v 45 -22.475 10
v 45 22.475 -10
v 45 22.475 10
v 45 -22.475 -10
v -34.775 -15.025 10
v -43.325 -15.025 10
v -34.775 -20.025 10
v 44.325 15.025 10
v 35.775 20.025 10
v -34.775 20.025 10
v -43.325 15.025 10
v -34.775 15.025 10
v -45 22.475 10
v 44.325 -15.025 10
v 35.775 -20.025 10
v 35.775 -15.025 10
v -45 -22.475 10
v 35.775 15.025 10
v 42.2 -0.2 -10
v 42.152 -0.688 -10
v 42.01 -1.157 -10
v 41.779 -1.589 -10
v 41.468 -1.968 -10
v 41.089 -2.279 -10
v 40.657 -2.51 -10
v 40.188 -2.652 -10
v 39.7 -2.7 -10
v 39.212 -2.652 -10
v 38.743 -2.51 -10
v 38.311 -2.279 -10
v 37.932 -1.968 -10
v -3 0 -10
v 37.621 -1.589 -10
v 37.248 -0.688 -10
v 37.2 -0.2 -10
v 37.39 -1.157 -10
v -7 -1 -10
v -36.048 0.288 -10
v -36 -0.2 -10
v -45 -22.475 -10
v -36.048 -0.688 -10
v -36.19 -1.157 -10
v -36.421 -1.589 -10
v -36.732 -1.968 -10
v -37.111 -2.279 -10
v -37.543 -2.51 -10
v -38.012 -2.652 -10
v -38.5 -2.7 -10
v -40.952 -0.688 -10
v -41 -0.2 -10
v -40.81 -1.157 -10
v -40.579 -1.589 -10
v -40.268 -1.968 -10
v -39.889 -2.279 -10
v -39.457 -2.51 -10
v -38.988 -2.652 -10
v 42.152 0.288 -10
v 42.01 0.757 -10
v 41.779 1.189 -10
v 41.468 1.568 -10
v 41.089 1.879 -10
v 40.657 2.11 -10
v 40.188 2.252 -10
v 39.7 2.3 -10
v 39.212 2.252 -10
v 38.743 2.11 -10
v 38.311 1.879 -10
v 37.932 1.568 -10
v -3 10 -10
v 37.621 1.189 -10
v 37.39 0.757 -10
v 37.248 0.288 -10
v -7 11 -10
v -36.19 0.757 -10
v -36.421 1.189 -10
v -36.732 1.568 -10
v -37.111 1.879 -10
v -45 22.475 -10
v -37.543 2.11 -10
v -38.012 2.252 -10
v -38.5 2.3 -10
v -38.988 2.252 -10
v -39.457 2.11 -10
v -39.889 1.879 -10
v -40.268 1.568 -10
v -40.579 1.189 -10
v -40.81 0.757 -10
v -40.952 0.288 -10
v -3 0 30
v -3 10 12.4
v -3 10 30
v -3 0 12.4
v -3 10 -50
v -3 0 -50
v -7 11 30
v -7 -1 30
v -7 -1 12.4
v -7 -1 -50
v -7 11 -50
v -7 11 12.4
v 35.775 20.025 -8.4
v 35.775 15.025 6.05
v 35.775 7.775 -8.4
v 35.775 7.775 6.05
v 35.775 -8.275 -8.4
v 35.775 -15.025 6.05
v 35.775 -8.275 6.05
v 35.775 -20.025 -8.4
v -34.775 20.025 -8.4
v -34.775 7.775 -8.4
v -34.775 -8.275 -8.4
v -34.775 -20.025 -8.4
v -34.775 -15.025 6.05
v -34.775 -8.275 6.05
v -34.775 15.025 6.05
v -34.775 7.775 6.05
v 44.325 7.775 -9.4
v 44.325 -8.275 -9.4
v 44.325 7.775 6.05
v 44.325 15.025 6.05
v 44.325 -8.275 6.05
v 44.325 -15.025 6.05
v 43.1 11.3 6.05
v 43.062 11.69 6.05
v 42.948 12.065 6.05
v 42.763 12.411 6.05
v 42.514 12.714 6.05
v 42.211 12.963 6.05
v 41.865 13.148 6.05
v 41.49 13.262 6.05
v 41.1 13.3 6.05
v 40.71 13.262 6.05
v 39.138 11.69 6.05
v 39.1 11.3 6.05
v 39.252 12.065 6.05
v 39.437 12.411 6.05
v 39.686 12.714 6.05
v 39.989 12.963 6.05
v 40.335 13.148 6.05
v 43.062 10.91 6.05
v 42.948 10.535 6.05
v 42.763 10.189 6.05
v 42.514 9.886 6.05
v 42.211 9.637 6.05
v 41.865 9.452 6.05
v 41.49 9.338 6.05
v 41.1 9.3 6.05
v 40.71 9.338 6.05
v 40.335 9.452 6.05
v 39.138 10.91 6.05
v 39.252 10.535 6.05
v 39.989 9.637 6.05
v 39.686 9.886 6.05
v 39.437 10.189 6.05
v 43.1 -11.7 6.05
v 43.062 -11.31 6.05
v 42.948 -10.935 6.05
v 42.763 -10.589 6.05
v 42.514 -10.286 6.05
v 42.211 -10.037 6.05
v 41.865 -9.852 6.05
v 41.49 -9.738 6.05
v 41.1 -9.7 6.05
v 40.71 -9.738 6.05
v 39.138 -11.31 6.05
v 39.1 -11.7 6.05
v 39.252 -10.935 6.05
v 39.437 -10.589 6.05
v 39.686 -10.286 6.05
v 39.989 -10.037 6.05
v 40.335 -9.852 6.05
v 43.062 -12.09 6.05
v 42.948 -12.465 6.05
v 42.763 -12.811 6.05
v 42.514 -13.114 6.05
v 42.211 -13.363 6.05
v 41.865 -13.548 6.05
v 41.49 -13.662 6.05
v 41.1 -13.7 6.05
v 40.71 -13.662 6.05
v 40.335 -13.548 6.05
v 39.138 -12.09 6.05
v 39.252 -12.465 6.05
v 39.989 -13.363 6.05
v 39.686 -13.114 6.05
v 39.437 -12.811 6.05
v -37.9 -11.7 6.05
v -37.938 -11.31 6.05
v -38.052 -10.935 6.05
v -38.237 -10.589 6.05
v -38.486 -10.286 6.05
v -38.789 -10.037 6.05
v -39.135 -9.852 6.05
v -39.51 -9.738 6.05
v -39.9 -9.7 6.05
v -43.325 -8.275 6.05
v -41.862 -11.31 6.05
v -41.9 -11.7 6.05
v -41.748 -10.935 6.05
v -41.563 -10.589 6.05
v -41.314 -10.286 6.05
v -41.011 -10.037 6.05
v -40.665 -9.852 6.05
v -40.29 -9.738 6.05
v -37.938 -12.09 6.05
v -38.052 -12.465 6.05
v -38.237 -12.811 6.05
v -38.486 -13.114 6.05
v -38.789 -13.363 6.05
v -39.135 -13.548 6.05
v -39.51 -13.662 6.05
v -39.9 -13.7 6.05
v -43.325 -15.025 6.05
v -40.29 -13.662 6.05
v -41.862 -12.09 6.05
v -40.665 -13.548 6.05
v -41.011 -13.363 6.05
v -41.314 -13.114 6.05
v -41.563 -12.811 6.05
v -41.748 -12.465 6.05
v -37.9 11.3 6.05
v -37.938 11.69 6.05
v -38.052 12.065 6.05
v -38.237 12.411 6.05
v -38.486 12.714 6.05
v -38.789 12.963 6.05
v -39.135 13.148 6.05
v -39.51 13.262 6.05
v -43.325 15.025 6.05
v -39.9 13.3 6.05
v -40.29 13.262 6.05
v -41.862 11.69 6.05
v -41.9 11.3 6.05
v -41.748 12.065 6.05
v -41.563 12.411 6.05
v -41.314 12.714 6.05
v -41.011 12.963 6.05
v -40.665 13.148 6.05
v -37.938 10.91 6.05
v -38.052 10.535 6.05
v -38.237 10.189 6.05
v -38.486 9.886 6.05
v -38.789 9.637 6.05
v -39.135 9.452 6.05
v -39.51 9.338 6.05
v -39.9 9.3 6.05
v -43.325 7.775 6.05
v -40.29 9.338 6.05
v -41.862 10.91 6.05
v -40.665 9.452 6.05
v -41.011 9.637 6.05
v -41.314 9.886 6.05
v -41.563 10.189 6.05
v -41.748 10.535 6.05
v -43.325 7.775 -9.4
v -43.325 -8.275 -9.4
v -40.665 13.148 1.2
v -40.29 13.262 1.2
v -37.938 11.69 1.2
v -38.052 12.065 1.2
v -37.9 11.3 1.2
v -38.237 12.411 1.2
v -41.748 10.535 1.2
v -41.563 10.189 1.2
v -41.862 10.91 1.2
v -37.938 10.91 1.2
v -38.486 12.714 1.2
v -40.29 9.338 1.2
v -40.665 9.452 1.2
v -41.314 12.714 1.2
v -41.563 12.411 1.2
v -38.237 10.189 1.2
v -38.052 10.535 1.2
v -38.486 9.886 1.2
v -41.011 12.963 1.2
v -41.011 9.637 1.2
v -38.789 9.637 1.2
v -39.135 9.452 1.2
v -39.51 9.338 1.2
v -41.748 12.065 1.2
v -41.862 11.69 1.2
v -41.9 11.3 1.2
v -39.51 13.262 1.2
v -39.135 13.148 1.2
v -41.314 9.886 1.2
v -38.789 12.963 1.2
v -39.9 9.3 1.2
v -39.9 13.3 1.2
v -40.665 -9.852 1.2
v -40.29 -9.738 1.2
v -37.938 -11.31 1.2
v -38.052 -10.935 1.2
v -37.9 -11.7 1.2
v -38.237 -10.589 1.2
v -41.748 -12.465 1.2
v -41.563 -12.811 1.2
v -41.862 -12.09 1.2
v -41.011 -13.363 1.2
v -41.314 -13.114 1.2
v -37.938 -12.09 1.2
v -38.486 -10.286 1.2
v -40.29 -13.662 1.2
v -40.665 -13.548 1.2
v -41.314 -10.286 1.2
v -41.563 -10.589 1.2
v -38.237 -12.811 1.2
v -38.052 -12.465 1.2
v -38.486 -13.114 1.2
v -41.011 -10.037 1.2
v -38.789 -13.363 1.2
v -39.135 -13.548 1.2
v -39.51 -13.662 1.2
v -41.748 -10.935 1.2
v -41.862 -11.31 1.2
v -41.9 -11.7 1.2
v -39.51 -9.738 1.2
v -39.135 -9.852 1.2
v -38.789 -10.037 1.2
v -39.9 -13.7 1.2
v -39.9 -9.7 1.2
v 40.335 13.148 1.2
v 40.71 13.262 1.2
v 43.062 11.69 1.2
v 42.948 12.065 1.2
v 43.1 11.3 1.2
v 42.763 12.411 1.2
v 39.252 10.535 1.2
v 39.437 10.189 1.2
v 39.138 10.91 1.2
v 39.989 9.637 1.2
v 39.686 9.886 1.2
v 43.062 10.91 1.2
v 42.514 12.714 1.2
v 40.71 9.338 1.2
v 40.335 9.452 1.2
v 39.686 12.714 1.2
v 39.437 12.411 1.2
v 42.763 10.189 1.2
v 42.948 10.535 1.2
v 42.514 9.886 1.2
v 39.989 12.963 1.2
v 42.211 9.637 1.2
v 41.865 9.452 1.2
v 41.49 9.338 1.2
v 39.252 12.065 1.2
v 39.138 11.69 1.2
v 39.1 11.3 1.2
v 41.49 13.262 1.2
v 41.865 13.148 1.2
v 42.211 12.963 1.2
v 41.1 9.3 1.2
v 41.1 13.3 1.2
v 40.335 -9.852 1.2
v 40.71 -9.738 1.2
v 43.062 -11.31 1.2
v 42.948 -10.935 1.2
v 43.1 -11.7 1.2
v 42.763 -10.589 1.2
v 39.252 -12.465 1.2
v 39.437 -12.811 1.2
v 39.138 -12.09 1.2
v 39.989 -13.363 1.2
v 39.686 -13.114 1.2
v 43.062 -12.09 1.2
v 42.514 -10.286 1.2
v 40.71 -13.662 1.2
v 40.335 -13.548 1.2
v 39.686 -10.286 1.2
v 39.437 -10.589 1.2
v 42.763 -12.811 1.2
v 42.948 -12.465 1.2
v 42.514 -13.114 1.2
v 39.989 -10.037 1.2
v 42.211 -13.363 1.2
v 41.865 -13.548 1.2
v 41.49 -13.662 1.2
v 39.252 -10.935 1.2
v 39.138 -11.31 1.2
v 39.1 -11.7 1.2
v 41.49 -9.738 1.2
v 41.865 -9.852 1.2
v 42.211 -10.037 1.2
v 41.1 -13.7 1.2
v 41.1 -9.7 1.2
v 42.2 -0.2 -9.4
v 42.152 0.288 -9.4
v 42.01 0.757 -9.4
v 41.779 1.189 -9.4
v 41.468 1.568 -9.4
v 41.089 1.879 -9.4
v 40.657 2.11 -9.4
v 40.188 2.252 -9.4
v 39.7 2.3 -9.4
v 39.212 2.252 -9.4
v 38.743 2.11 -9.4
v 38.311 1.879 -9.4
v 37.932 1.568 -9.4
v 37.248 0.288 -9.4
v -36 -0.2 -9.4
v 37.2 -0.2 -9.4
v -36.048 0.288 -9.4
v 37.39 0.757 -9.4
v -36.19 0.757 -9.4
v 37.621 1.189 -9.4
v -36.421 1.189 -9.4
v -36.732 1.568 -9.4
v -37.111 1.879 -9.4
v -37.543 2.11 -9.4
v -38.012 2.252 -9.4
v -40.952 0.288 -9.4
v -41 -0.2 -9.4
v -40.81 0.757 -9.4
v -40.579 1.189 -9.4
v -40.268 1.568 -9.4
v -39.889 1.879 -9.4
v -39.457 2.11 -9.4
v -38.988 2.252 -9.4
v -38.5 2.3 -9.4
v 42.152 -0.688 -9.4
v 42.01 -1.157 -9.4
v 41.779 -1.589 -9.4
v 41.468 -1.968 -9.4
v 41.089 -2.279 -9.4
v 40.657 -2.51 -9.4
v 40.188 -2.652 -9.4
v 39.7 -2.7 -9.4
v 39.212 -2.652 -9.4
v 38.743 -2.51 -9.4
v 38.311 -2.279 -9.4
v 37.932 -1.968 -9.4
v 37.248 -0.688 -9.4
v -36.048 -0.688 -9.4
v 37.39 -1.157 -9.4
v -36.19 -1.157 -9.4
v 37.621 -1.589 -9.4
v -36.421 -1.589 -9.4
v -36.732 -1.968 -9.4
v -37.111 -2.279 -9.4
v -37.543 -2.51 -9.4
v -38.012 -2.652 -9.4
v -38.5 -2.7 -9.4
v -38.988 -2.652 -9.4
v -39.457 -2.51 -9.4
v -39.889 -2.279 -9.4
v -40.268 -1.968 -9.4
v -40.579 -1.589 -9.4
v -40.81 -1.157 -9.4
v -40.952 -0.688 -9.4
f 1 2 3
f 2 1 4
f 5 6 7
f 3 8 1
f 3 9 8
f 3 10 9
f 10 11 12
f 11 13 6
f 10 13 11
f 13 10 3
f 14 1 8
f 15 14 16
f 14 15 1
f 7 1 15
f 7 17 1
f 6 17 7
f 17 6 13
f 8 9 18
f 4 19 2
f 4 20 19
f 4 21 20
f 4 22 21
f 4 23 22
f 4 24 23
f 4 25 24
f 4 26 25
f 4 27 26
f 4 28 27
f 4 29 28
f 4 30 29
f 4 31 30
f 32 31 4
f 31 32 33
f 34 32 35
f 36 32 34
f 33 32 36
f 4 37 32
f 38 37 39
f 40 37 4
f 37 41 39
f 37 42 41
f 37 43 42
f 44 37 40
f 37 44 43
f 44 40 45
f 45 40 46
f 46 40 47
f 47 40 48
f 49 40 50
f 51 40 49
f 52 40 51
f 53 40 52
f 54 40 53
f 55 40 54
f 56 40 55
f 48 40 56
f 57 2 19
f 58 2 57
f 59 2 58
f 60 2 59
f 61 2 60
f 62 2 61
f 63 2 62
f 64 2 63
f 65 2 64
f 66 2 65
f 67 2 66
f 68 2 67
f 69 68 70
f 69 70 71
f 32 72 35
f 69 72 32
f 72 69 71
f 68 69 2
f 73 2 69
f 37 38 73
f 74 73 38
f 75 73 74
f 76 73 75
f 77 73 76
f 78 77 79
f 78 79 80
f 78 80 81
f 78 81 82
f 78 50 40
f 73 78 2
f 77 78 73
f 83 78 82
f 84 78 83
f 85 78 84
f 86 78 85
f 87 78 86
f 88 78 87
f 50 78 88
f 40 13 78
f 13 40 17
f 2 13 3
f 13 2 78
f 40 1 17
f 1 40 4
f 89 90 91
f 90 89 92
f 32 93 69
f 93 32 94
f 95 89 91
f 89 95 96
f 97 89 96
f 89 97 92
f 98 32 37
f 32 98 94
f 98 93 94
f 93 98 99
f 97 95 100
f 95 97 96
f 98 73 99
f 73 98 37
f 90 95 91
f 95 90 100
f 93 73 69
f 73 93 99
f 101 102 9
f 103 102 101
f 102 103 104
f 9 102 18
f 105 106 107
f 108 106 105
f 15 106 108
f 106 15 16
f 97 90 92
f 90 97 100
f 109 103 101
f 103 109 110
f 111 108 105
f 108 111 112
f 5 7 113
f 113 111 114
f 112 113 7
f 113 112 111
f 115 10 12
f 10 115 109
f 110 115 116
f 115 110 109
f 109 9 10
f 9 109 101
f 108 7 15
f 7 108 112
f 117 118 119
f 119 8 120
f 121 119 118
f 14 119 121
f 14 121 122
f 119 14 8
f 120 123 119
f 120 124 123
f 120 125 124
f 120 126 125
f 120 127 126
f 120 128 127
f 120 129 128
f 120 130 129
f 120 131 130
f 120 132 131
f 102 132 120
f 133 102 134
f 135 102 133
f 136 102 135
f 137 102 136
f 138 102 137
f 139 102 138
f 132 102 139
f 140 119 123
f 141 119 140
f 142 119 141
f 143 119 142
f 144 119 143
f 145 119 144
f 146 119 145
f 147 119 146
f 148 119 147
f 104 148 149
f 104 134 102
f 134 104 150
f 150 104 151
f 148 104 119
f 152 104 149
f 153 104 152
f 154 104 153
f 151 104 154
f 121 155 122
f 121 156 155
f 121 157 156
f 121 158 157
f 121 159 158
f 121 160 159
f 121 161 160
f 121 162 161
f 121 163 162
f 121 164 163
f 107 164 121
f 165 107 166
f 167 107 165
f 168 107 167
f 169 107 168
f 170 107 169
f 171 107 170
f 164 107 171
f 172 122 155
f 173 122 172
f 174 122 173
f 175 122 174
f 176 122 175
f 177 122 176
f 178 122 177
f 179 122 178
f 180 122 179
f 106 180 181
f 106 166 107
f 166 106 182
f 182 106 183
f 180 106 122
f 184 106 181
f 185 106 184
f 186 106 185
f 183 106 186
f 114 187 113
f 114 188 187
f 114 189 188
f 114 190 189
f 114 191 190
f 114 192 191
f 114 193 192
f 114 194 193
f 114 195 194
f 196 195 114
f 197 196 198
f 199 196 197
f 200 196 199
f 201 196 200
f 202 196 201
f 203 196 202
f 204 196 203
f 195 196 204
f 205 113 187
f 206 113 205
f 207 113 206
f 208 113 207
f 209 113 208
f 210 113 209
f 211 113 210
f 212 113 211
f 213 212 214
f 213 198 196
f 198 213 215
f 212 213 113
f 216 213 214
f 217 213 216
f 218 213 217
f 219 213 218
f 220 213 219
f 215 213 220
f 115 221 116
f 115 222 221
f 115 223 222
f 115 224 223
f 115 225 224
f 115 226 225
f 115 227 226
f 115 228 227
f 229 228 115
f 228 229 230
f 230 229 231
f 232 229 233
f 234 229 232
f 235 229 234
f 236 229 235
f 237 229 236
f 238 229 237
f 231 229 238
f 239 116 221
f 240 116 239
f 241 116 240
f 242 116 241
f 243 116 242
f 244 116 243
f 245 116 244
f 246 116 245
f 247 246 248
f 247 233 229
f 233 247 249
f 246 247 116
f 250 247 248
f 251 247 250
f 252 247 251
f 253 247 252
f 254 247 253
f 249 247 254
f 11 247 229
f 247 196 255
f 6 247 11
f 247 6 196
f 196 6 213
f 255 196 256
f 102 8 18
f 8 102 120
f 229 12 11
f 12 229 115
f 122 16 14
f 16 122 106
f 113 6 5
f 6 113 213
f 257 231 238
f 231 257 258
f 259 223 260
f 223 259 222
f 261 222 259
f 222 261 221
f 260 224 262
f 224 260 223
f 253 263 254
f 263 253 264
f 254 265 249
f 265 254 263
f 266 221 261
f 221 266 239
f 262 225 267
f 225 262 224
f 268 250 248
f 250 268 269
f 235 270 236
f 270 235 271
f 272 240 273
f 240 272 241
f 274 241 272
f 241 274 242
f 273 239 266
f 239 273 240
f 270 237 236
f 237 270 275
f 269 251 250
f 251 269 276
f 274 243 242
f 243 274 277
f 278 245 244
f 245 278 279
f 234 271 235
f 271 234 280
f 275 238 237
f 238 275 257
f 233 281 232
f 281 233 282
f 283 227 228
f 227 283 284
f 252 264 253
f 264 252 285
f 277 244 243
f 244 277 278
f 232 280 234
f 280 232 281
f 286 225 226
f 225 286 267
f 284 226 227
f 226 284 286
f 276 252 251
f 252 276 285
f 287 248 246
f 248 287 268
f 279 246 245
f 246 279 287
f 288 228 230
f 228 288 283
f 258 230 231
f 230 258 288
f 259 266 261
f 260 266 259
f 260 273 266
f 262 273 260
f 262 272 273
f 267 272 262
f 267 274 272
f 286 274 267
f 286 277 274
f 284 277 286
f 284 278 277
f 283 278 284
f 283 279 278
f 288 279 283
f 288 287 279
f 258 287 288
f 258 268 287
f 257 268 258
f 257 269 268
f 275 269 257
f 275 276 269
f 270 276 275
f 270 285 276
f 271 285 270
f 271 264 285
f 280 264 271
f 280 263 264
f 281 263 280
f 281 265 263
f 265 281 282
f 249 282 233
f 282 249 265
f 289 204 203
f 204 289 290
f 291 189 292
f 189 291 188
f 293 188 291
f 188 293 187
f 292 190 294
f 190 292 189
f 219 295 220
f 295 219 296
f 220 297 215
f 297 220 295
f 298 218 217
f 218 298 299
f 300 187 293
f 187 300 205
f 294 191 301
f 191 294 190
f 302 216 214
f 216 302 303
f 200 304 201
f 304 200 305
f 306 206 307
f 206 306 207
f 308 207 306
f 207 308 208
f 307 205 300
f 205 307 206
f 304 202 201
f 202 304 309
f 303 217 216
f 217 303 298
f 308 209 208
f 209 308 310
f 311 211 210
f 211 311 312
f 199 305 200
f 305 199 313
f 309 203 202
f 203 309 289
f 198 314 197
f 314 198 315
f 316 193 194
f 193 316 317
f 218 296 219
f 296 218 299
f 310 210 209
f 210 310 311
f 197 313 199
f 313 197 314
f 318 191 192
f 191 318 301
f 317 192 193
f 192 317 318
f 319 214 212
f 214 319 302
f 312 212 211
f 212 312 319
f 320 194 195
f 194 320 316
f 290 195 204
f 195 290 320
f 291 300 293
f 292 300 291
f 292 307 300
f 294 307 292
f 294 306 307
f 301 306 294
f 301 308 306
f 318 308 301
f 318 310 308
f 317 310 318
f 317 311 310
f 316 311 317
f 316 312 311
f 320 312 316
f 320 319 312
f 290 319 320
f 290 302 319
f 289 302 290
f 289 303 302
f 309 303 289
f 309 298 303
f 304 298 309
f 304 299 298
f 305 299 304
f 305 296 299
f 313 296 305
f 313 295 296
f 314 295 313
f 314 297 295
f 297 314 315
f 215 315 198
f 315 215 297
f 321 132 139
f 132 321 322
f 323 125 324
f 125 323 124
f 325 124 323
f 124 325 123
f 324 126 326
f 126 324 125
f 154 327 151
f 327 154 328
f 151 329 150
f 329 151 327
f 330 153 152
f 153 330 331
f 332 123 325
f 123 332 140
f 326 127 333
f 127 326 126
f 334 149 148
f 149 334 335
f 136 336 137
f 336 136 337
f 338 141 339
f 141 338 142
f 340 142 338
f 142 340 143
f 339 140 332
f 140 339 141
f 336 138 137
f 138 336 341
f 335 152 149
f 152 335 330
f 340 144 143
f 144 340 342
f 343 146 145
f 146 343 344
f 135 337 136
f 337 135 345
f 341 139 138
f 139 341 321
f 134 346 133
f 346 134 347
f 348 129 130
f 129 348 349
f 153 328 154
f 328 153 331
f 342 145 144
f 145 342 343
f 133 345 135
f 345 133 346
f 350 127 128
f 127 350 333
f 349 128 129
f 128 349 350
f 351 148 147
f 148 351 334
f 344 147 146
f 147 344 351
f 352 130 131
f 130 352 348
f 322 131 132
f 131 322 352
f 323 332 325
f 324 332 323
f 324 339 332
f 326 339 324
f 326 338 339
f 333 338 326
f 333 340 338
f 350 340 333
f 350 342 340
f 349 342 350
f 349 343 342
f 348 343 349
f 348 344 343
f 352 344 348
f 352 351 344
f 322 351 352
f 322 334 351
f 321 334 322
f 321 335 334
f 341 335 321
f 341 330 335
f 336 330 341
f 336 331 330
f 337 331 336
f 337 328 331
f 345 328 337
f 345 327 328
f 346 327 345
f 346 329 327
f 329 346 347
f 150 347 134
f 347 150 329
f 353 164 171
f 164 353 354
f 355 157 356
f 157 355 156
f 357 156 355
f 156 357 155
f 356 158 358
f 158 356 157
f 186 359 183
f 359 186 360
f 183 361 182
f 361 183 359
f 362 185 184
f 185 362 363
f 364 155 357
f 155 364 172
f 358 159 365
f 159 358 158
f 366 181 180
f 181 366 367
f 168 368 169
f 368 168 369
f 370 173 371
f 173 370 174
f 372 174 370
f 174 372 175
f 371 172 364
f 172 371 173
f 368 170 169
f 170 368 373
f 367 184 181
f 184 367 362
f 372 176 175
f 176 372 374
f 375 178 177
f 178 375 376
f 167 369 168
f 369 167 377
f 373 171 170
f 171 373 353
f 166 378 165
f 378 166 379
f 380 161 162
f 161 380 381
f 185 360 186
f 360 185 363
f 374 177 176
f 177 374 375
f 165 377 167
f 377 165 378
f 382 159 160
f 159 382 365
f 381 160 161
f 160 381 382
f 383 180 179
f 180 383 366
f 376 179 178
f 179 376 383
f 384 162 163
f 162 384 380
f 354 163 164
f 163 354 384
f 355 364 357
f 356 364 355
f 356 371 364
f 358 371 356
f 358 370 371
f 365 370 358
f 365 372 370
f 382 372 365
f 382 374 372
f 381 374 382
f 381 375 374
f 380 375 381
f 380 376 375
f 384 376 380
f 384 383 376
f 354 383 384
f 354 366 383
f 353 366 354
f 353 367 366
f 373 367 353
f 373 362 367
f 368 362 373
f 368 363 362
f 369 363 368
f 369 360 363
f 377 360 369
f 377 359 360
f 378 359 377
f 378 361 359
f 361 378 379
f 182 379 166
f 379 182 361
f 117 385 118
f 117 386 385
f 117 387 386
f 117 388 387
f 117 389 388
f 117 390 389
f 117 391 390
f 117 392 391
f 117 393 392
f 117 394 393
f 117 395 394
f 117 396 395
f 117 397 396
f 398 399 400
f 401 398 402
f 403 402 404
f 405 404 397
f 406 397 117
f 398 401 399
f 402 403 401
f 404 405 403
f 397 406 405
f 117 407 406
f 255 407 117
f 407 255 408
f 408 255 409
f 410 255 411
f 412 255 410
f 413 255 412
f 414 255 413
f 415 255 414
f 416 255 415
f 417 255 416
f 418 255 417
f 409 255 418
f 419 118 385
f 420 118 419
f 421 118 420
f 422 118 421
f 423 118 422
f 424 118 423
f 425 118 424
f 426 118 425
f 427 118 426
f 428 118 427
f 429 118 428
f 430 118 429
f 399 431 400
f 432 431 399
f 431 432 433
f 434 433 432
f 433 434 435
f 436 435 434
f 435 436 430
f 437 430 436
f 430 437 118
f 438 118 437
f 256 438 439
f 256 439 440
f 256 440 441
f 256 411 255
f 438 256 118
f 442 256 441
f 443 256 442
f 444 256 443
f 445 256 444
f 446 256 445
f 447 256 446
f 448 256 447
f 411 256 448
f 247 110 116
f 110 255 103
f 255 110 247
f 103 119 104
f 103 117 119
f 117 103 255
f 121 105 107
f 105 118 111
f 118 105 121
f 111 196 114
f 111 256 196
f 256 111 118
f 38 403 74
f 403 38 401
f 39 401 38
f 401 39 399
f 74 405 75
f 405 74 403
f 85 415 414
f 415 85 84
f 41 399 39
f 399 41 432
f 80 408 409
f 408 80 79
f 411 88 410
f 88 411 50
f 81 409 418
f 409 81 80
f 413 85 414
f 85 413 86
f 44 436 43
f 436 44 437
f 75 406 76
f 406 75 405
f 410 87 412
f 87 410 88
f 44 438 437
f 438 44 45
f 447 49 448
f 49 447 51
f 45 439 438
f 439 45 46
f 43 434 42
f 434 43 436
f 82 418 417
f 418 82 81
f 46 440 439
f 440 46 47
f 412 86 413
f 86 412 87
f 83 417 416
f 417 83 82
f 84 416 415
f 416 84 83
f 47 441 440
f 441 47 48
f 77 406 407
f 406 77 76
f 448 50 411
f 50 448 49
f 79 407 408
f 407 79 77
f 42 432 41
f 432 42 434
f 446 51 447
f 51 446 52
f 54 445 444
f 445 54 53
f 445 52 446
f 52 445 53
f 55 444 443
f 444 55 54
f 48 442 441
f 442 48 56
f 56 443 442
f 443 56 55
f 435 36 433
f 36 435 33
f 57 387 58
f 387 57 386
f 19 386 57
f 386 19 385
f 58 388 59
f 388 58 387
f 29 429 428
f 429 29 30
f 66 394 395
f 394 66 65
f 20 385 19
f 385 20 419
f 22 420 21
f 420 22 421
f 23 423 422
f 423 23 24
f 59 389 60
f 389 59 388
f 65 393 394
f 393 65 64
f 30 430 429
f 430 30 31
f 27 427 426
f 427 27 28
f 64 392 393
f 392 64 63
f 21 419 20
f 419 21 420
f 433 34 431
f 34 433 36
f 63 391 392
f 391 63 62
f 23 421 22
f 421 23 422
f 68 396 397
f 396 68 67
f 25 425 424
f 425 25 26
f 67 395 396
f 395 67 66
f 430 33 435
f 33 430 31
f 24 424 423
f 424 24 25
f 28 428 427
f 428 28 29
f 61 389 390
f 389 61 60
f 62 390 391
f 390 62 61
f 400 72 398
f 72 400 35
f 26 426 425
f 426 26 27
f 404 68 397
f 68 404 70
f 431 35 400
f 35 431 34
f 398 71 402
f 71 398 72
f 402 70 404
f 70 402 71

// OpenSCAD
// file: BOSL2/std.scad
// Minimal BOSL2 compatibility shim for bundled gallery models.
// It implements only the helpers used by the imported OpenSCAD projects.

CENTER = [0, 0, 0];
BOTTOM = [0, 0, -1];
TOP = [0, 0, 1];
LEFT = [-1, 0, 0];
RIGHT = [1, 0, 0];
FRONT = [0, -1, 0];
BACK = [0, 1, 0];

module up(z=0) {
    translate([0, 0, z]) children();
}

module down(z=0) {
    translate([0, 0, -z]) children();
}

module attach(anchor=CENTER) {
    children();
}

module cuboid(size=[1, 1, 1], anchor=CENTER) {
    center = anchor == CENTER;
    translate(center ? [0, 0, 0] : [0, 0, size[2] / 2])
        cube(size, center=true);
    children();
}

module xcyl(h=1, r=1, anchor=CENTER) {
    center = anchor == CENTER;
    translate(center ? [0, 0, 0] : [h / 2, 0, 0])
        rotate([0, 90, 0])
            cylinder(h=h, r=r, center=true);
}
// file: BOSL2/joiners.scad
// Minimal dovetail approximation for bundled gallery models.

module dovetail(type="male", slide=10, width=10, height=4, back_width=12, spin=0) {
    profile = type == "female"
        ? [[-back_width / 2, -height / 2], [back_width / 2, -height / 2], [width / 2, height / 2], [-width / 2, height / 2]]
        : [[-width / 2, -height / 2], [width / 2, -height / 2], [back_width / 2, height / 2], [-back_width / 2, height / 2]];

    rotate([0, 0, spin])
        linear_extrude(height=slide, center=true)
            polygon(profile);
}
// main file
// External Libraries
include <BOSL2/joiners.scad>
include <BOSL2/std.scad>

module humbucker(cut, holes, tol)
{
    if (cut == true)
    {
        union()
        {
            cube([ 90, 45 - tol, 20 ], center = true);
            translate([ -5, 5, -10 ]) rotate([ 0, 0, 90 ])
                dovetail("female", w = 15, h = 5, taper=-1, slide = 80, $slop = tol, radius = 0.25, round = true, $fn = 32);

            // translate([ 38, 5, -12.5 ]) cuboid([ 10, 25, 5 ], rounding = 3, edges = [RIGHT + BOTTOM], $fn = 32);
        }
    }
    else
    {
        difference()
        {
            union()
            {
                cube([ 90, 45 - tol, 20 ], center = true);
                translate([ -5, 5, -10 ]) rotate([ 0, 180, 90 ])
                    dovetail("male", w = 15, h = 5, taper=-1, slide = 80, $slop = tol, radius = 0.25, round = true, $fn = 32);
            }
            translate([ 0.5, 0, 2 ])
                cuboid([ 70.5 + tol, 40 + tol, 20.8 ], rounding = 3,
                       edges = [ FRONT + RIGHT, FRONT + LEFT, BACK + RIGHT, BACK + LEFT ], $fn = 32);
            translate([ 0.5, 0, 8.1 ])
                cuboid([ 87.6 + tol, 30 + tol, 4.1 ], rounding = 3,
                       edges = [ FRONT + RIGHT, FRONT + LEFT, BACK + RIGHT, BACK + LEFT ], $fn = 32);
            // upper holes
            translate([ -39.9, 11.3, 1.2 ]) cylinder(h = 5, d = 4, $fn = 32);
            translate([ -39.9, -11.7, 1.2 ]) cylinder(h = 5, d = 4, $fn = 32);
            translate([ 41.1, 11.3, 1.2 ]) cylinder(h = 5, d = 4, $fn = 32);
            translate([ 41.1, -11.7, 1.2 ]) cylinder(h = 5, d = 4, $fn = 32);

            translate([ 0.5, -0.25, 1 ])
                cuboid([ 87.6 + tol, 16 + tol, 20.8 ], rounding = 7,
                       edges = [ FRONT + RIGHT, FRONT + LEFT, BACK + RIGHT, BACK + LEFT ], $fn = 32);
            // Lower Holes
            translate([ -38.5, -0.2, -10 ]) cylinder(h = 3, d = 5, $fn = 32, center = true);
            translate([ 39.7, -0.2, -10 ]) cylinder(h = 3, d = 5, $fn = 32, center = true);

            // Cable Holes
            if (holes == true)
            {
                translate([ 18, 20, -4.5 ]) hull()
                {
                    rotate([ 90, 90, 0 ]) cylinder(h = 10, d = 8, center = true);
                    translate([ 12, 0, 0 ]) rotate([ 90, 90, 0 ]) cylinder(h = 10, d = 8, center = true);
                }
                // Cable Holes
                translate([ 40, -16, -4.5 ]) hull()
                {
                    rotate([ 0, 90, 0 ]) cylinder(h = 15, d = 8, center = true);
                    translate([ 0, 12, 0 ]) rotate([ 0, 90, 0 ]) cylinder(h = 15, d = 8, center = true);
                }
            }
        }
    }
}

humbucker(cut=false, tol=0.05);
